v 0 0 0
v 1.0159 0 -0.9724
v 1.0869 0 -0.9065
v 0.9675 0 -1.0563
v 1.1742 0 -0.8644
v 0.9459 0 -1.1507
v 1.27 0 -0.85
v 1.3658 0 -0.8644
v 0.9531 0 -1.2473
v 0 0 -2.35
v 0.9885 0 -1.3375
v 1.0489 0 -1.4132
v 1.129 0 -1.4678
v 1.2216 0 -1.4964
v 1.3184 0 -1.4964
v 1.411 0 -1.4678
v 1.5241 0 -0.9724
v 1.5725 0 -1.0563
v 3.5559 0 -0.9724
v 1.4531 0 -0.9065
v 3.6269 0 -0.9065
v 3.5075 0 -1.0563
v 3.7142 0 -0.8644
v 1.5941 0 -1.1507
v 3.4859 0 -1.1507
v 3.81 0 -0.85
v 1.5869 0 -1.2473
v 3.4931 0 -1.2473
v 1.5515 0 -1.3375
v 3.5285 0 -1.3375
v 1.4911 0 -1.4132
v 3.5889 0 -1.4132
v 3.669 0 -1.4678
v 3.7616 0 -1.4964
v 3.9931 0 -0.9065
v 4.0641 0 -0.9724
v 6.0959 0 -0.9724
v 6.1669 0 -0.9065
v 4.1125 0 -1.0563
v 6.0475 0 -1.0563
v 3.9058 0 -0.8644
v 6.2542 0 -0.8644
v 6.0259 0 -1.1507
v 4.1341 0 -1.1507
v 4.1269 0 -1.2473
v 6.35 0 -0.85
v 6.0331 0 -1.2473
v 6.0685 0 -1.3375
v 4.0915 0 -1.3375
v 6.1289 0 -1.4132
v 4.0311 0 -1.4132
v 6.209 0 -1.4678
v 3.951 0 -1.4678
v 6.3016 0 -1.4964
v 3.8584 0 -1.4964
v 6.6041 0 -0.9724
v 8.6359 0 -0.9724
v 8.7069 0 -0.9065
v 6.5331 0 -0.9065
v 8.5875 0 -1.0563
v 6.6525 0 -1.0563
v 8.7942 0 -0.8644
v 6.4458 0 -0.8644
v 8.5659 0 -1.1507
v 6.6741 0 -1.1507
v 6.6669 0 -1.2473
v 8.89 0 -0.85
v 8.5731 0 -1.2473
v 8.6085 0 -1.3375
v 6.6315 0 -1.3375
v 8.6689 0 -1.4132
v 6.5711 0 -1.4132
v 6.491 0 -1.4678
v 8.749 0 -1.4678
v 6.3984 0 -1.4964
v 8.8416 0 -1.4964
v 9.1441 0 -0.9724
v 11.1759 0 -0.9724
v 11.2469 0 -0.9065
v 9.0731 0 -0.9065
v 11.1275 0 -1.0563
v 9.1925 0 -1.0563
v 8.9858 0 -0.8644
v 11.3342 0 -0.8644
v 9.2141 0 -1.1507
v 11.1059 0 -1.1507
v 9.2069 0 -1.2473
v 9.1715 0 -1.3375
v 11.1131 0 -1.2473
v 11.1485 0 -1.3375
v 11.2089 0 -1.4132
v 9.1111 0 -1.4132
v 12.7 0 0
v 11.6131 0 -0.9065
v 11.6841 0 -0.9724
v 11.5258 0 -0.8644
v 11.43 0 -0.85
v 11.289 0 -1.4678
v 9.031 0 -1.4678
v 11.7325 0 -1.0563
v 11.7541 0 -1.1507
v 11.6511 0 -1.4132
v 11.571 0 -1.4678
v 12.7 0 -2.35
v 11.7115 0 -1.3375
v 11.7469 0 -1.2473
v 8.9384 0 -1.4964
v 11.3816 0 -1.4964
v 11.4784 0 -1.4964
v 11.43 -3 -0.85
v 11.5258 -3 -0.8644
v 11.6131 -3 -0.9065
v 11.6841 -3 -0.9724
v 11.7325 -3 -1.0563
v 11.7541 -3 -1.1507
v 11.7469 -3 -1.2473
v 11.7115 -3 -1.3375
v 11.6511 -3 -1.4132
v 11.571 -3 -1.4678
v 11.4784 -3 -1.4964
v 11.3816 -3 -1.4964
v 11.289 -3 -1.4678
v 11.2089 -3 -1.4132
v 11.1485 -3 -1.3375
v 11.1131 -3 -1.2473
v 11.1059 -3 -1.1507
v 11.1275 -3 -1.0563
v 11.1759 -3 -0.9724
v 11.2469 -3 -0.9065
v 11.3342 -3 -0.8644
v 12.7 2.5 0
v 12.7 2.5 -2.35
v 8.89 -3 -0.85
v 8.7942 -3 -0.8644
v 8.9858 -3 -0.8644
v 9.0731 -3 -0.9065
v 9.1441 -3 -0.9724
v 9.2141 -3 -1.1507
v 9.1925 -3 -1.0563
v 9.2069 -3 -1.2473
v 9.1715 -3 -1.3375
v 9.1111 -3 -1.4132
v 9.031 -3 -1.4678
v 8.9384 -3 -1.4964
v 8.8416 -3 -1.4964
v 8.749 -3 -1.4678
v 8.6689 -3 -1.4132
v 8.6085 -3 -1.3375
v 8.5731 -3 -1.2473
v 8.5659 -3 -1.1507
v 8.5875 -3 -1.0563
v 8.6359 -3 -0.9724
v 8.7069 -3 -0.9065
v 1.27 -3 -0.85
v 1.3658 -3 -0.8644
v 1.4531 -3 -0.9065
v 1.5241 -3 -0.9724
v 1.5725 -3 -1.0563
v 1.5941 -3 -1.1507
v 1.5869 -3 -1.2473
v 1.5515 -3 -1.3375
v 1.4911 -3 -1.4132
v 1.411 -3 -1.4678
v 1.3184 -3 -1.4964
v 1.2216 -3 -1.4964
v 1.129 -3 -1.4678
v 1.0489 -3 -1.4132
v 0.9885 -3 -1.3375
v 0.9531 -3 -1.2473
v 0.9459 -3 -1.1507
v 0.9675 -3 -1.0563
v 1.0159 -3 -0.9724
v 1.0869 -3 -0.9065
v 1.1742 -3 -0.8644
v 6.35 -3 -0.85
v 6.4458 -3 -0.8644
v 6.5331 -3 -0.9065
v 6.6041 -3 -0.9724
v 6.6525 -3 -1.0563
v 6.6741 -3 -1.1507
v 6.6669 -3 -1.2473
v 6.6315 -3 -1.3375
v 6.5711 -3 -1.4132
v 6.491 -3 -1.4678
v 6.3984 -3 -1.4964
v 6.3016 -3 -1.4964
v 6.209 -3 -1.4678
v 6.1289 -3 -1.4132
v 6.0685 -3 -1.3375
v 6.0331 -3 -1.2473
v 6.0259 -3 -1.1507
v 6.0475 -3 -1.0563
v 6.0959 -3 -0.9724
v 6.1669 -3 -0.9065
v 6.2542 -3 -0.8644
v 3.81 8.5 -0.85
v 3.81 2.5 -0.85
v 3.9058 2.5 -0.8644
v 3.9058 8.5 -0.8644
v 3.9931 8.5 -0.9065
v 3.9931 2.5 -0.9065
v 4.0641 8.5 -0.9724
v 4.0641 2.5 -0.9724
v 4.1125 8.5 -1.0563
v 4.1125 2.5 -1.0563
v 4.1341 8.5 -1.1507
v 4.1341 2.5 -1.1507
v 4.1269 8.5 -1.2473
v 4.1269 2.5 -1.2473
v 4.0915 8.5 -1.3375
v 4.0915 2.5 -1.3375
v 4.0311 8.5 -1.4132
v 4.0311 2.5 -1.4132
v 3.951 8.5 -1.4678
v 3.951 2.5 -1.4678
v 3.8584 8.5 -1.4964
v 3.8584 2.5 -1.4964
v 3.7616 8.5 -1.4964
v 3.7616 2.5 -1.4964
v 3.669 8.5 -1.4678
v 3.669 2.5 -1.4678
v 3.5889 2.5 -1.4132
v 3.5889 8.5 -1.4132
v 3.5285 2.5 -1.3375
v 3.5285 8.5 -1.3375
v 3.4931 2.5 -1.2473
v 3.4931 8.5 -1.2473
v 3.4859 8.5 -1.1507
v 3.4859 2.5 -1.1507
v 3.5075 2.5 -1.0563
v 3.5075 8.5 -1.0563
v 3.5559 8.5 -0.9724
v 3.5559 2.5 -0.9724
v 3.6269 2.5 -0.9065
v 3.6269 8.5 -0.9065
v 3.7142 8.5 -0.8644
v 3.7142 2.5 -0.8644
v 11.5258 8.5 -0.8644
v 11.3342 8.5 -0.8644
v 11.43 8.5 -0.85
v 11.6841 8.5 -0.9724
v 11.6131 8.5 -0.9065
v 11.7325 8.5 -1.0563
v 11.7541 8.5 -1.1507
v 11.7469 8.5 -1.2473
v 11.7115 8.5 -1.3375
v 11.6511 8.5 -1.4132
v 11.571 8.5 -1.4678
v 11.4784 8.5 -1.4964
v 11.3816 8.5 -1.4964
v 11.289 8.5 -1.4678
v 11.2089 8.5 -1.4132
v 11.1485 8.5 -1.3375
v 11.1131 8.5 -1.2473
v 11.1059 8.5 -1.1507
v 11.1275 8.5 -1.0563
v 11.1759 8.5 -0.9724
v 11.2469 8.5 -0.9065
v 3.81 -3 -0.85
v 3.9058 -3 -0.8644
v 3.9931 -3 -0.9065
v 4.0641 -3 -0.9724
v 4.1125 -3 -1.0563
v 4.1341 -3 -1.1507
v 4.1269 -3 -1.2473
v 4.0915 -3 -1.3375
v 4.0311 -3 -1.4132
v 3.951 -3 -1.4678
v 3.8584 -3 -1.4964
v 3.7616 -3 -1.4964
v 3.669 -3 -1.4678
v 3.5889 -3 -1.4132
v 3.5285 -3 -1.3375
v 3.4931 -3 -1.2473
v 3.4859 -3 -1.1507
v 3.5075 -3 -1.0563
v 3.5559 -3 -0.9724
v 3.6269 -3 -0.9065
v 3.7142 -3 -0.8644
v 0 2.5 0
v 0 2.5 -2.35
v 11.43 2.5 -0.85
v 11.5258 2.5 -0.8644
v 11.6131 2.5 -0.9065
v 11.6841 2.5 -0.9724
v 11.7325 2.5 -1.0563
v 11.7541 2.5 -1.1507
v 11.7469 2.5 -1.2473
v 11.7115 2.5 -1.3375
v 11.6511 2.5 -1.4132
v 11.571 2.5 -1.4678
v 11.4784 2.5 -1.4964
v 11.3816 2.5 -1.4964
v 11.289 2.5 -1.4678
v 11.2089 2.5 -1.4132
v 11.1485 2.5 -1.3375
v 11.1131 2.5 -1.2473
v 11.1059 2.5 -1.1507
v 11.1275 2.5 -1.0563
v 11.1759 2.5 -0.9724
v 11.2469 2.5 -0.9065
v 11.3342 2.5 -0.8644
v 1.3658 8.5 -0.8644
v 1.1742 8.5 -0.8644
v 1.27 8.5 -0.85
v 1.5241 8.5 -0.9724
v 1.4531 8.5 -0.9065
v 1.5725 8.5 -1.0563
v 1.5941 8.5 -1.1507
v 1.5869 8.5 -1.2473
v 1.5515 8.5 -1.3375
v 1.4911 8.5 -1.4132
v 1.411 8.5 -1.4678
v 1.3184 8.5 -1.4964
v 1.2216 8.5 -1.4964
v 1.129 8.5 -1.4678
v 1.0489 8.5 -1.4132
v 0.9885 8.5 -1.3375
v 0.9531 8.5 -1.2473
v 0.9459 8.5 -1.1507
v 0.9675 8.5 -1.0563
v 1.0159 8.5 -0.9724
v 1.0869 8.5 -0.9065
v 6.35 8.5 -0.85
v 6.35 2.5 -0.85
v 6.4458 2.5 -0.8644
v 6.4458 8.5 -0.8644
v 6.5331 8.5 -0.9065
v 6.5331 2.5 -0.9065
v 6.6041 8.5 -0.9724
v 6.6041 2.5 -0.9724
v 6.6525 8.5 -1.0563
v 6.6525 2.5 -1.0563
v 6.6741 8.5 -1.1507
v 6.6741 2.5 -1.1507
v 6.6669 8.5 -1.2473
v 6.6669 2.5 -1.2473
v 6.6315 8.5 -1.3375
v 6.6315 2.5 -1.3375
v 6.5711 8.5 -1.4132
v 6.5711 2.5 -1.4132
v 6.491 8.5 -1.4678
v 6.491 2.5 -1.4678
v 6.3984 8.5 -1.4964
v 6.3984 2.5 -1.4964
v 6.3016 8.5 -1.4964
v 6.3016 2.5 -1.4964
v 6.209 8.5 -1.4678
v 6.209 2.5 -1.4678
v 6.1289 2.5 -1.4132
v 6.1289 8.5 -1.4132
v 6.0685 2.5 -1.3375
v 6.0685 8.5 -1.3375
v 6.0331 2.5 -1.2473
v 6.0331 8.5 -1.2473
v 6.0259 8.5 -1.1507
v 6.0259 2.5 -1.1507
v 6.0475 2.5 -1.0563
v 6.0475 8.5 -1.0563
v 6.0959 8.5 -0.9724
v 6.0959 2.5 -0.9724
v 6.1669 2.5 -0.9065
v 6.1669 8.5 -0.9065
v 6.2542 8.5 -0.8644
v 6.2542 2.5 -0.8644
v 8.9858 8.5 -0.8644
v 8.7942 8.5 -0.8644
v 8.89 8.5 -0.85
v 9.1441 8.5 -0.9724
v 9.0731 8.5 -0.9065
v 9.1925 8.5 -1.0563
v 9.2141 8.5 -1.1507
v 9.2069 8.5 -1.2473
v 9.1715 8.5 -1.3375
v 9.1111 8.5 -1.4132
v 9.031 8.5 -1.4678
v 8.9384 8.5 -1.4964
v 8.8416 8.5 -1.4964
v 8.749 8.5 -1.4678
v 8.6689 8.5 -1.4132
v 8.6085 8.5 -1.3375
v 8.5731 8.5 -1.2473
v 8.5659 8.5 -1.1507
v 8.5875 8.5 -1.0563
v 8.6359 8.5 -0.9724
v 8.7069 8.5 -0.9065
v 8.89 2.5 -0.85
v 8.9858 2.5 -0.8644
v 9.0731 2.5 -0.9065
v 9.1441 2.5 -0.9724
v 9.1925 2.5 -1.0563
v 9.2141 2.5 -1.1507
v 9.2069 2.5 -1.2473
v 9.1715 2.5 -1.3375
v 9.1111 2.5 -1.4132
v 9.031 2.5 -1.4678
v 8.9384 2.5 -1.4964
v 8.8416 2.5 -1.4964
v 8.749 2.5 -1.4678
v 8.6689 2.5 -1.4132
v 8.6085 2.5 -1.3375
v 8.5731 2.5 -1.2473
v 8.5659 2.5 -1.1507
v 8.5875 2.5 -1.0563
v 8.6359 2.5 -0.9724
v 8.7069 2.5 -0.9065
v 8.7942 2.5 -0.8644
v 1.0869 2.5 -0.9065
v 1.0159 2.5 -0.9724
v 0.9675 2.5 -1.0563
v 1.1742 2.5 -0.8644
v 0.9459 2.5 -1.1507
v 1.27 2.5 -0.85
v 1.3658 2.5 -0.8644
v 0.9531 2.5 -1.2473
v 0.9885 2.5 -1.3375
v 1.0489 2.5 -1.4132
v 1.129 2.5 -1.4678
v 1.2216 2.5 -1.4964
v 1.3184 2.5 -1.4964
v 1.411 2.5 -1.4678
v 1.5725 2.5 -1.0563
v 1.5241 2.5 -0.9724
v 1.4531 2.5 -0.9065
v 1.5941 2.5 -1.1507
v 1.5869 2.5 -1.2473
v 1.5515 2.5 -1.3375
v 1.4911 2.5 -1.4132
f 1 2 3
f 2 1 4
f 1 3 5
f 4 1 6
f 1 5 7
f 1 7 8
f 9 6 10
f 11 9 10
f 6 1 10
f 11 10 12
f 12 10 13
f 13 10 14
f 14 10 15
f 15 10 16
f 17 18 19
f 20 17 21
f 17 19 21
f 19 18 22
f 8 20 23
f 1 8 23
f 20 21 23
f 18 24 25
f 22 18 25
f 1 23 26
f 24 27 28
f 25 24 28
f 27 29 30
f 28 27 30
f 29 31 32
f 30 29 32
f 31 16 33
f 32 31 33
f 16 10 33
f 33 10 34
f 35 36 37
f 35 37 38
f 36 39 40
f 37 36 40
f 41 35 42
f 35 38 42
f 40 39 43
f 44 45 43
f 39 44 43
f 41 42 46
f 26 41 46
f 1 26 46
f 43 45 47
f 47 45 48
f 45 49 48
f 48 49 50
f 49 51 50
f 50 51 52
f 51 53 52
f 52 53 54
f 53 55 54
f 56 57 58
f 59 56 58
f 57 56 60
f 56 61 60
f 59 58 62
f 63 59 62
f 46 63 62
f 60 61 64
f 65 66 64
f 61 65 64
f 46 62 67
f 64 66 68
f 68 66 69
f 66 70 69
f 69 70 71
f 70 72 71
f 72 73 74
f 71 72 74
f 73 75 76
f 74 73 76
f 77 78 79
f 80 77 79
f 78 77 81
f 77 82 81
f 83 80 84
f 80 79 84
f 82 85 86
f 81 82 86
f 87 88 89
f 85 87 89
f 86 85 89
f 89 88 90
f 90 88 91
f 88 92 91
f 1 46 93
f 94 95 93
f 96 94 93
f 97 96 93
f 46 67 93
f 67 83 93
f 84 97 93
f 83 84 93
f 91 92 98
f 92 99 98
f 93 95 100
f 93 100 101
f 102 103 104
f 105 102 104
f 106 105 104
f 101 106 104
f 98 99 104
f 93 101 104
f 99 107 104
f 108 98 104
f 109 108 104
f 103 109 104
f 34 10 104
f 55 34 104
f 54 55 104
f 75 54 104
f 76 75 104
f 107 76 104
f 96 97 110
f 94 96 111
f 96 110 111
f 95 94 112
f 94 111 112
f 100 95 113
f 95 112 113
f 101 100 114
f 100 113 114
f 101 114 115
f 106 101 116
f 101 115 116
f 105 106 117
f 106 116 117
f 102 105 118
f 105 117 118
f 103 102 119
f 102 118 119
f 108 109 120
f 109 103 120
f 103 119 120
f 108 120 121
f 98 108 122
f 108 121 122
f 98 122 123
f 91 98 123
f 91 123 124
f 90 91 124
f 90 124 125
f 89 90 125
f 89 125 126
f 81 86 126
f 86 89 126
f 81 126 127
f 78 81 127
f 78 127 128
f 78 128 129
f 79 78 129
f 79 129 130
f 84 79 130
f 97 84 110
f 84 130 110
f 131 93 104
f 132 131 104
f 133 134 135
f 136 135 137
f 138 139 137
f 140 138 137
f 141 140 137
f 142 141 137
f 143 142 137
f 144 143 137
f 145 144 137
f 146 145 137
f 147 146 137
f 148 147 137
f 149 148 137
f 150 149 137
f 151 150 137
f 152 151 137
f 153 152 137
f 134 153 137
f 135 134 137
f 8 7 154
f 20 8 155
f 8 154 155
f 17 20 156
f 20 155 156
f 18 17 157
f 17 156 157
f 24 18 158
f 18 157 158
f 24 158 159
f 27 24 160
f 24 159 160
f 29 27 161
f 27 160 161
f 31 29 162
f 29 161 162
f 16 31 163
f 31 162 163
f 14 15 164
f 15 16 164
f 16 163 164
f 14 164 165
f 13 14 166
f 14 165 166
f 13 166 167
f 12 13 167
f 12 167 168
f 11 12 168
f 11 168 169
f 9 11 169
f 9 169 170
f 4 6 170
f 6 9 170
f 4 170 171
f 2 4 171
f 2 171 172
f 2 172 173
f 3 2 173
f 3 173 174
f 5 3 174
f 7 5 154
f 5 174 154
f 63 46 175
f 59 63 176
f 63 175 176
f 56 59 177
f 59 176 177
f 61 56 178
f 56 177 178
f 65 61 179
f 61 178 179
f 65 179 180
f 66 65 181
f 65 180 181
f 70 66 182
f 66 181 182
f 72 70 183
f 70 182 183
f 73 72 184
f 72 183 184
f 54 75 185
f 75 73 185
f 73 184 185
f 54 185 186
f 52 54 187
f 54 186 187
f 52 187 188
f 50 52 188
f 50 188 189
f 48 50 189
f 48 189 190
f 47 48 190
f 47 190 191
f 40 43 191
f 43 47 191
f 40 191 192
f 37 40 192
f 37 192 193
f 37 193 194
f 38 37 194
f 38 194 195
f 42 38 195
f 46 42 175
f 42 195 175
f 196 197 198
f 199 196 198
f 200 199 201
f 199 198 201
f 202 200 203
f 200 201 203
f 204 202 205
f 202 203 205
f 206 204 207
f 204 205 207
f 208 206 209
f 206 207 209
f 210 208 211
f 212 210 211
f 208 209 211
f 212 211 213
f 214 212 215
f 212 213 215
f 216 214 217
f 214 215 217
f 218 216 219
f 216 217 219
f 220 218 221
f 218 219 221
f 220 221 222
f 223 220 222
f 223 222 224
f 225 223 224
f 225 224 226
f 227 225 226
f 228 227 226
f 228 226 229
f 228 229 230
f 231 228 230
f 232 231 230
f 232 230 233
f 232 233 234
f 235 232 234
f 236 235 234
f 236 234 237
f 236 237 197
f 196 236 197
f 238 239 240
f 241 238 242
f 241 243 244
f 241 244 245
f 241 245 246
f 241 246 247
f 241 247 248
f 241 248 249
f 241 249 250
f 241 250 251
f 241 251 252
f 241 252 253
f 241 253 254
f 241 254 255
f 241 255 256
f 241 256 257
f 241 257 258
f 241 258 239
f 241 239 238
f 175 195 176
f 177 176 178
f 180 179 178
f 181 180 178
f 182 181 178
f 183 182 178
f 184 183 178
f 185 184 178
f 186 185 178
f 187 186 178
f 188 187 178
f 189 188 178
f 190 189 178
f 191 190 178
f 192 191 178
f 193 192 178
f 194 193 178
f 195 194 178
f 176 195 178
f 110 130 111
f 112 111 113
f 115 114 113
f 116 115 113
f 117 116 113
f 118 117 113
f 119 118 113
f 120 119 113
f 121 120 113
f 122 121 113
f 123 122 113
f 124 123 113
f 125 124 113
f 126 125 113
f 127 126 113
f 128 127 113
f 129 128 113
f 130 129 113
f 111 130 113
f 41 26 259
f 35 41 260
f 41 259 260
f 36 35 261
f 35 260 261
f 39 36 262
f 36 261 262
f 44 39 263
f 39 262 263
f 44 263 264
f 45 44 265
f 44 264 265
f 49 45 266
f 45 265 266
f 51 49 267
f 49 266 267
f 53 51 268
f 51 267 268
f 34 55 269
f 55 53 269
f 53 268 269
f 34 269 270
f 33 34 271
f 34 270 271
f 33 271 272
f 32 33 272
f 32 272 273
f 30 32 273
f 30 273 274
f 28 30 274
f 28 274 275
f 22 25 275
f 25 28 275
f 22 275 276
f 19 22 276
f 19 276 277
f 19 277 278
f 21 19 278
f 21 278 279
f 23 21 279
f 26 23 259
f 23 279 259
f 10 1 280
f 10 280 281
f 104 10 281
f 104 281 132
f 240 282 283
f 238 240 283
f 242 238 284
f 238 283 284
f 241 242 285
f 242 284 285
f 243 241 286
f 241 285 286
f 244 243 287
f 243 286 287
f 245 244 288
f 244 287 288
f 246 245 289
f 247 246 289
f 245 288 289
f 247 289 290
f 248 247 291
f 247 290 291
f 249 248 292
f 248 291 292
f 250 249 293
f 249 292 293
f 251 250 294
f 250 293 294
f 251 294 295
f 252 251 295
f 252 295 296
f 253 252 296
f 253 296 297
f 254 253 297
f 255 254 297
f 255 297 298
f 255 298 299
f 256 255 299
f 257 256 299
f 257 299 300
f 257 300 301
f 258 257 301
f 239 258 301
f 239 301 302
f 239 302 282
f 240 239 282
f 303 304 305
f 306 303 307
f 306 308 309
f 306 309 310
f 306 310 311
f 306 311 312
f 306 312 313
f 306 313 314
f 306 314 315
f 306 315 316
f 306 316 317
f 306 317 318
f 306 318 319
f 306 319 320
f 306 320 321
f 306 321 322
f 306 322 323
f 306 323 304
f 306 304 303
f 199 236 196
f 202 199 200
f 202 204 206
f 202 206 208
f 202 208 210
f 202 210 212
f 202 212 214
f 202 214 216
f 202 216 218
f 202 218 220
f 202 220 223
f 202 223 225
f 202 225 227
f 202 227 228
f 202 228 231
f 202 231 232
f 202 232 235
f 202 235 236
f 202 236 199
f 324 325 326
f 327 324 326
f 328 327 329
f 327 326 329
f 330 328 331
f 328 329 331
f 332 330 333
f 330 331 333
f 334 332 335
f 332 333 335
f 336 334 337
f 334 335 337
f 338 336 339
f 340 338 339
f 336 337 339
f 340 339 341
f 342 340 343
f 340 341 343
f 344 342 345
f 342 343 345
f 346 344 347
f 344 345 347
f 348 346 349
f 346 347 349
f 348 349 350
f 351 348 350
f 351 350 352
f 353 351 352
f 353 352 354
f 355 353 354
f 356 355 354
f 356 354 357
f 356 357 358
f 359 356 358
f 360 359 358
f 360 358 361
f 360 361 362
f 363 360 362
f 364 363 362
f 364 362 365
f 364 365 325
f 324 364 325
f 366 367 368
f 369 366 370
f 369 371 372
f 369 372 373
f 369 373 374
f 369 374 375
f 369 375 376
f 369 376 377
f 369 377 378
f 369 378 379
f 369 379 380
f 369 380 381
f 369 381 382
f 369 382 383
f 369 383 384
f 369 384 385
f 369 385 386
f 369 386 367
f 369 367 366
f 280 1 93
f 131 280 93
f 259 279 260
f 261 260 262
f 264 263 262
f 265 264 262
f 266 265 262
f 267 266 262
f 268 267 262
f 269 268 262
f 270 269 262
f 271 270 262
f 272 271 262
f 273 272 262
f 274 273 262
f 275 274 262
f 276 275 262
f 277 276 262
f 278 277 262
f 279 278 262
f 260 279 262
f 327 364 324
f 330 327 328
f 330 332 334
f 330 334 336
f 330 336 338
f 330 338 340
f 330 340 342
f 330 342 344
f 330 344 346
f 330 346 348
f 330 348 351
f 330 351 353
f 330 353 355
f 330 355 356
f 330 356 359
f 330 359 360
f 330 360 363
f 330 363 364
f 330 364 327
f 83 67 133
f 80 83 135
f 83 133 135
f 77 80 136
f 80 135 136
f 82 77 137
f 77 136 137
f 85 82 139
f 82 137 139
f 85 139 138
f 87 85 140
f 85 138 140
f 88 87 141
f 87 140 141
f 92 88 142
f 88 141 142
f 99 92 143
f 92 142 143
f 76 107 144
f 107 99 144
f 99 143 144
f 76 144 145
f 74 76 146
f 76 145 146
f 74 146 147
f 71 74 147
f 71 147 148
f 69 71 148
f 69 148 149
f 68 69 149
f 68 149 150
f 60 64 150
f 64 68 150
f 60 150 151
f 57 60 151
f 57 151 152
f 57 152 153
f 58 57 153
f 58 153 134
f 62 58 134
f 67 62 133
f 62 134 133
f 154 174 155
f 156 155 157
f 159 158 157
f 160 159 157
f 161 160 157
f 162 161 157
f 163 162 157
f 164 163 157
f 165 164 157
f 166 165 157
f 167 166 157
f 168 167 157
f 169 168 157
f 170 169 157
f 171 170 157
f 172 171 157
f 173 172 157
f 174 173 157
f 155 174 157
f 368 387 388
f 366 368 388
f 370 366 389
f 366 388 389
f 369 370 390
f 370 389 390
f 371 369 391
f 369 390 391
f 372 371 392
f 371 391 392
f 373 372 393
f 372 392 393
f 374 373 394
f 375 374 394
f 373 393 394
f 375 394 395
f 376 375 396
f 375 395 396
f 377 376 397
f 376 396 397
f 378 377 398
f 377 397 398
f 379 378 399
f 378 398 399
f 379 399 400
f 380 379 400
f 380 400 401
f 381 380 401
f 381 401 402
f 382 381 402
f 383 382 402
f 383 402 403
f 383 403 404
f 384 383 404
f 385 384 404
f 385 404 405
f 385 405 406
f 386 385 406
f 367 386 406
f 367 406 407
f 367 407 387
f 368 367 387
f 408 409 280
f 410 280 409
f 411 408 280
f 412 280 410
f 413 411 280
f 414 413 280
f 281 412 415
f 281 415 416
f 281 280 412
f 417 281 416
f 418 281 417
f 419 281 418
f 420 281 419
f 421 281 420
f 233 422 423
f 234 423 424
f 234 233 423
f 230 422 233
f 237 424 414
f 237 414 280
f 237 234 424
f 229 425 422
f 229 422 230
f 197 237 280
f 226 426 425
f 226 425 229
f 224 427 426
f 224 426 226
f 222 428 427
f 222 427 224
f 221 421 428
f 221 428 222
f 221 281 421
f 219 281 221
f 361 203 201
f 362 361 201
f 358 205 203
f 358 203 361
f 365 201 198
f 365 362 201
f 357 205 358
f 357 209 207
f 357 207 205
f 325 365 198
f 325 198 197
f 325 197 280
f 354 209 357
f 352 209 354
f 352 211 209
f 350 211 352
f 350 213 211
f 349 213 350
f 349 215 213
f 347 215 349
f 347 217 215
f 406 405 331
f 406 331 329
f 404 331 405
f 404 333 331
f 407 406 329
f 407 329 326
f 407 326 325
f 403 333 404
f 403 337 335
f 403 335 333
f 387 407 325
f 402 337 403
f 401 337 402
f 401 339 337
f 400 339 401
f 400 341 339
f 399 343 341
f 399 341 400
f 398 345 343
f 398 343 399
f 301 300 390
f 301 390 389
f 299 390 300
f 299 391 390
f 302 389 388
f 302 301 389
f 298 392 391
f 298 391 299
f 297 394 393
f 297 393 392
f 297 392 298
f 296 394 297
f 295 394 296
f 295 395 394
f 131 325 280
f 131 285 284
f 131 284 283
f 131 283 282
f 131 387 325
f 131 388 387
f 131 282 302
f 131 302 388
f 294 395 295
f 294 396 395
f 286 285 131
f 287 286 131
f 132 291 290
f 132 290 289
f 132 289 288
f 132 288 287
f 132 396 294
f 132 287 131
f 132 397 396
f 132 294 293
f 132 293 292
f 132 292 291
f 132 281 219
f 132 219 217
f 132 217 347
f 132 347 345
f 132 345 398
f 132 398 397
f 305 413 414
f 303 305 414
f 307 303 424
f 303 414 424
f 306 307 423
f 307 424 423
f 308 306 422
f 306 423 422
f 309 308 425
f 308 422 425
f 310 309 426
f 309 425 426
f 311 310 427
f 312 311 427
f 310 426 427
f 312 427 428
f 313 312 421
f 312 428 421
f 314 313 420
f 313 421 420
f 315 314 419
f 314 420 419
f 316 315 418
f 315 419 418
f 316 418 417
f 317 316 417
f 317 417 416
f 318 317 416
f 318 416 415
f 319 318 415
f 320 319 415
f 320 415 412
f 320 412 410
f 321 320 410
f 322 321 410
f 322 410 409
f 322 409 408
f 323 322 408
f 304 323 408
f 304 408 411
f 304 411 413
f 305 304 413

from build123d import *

# Parameters (mm, degrees)
ESQUISSE1_W                = 2.54
ESQUISSE1_H                = 2.35
BOSS_EXTRU_1_DEPTH         = 2.5
BOSS_EXTRU_2_START         = -3
ESQUISSE2_R                = 0.325
BOSS_EXTRU_2_DEPTH         = 11.5
R_P_TITION_LIN_AIRE1_COUNT = 5
R_P_TITION_LIN_AIRE1_PITCH = 2.54


with BuildPart() as part:
    # Esquisse1 → Boss.-Extru.1 (new body)
    with BuildSketch(Plane(origin=(0, 0, 0), x_dir=(1, 0, 0), z_dir=(0, 1, 0))):
        with Locations((1.27, 1.175)):
            Rectangle(ESQUISSE1_W, ESQUISSE1_H)
    boss_extru_1 = extrude(amount=BOSS_EXTRU_1_DEPTH)

    # Esquisse2 → Boss.-Extru.2 (add)
    with BuildSketch(Plane(origin=(0, 0, 0), x_dir=(1, 0, 0), z_dir=(0, 1, 0)).offset(BOSS_EXTRU_2_START)):
        with Locations(Location((1.27, 1.175, 0), (0, 0, 270))):
            Circle(ESQUISSE2_R)
    boss_extru_2 = extrude(amount=BOSS_EXTRU_2_DEPTH)

    # Répétition linéaire1: Boss.-Extru.1, Boss.-Extru.2 ×5
    with Locations(*[(i * R_P_TITION_LIN_AIRE1_PITCH, 0, 0) for i in range(1, R_P_TITION_LIN_AIRE1_COUNT)]):
        add(boss_extru_1)
        add(boss_extru_2)


solid = part.part
